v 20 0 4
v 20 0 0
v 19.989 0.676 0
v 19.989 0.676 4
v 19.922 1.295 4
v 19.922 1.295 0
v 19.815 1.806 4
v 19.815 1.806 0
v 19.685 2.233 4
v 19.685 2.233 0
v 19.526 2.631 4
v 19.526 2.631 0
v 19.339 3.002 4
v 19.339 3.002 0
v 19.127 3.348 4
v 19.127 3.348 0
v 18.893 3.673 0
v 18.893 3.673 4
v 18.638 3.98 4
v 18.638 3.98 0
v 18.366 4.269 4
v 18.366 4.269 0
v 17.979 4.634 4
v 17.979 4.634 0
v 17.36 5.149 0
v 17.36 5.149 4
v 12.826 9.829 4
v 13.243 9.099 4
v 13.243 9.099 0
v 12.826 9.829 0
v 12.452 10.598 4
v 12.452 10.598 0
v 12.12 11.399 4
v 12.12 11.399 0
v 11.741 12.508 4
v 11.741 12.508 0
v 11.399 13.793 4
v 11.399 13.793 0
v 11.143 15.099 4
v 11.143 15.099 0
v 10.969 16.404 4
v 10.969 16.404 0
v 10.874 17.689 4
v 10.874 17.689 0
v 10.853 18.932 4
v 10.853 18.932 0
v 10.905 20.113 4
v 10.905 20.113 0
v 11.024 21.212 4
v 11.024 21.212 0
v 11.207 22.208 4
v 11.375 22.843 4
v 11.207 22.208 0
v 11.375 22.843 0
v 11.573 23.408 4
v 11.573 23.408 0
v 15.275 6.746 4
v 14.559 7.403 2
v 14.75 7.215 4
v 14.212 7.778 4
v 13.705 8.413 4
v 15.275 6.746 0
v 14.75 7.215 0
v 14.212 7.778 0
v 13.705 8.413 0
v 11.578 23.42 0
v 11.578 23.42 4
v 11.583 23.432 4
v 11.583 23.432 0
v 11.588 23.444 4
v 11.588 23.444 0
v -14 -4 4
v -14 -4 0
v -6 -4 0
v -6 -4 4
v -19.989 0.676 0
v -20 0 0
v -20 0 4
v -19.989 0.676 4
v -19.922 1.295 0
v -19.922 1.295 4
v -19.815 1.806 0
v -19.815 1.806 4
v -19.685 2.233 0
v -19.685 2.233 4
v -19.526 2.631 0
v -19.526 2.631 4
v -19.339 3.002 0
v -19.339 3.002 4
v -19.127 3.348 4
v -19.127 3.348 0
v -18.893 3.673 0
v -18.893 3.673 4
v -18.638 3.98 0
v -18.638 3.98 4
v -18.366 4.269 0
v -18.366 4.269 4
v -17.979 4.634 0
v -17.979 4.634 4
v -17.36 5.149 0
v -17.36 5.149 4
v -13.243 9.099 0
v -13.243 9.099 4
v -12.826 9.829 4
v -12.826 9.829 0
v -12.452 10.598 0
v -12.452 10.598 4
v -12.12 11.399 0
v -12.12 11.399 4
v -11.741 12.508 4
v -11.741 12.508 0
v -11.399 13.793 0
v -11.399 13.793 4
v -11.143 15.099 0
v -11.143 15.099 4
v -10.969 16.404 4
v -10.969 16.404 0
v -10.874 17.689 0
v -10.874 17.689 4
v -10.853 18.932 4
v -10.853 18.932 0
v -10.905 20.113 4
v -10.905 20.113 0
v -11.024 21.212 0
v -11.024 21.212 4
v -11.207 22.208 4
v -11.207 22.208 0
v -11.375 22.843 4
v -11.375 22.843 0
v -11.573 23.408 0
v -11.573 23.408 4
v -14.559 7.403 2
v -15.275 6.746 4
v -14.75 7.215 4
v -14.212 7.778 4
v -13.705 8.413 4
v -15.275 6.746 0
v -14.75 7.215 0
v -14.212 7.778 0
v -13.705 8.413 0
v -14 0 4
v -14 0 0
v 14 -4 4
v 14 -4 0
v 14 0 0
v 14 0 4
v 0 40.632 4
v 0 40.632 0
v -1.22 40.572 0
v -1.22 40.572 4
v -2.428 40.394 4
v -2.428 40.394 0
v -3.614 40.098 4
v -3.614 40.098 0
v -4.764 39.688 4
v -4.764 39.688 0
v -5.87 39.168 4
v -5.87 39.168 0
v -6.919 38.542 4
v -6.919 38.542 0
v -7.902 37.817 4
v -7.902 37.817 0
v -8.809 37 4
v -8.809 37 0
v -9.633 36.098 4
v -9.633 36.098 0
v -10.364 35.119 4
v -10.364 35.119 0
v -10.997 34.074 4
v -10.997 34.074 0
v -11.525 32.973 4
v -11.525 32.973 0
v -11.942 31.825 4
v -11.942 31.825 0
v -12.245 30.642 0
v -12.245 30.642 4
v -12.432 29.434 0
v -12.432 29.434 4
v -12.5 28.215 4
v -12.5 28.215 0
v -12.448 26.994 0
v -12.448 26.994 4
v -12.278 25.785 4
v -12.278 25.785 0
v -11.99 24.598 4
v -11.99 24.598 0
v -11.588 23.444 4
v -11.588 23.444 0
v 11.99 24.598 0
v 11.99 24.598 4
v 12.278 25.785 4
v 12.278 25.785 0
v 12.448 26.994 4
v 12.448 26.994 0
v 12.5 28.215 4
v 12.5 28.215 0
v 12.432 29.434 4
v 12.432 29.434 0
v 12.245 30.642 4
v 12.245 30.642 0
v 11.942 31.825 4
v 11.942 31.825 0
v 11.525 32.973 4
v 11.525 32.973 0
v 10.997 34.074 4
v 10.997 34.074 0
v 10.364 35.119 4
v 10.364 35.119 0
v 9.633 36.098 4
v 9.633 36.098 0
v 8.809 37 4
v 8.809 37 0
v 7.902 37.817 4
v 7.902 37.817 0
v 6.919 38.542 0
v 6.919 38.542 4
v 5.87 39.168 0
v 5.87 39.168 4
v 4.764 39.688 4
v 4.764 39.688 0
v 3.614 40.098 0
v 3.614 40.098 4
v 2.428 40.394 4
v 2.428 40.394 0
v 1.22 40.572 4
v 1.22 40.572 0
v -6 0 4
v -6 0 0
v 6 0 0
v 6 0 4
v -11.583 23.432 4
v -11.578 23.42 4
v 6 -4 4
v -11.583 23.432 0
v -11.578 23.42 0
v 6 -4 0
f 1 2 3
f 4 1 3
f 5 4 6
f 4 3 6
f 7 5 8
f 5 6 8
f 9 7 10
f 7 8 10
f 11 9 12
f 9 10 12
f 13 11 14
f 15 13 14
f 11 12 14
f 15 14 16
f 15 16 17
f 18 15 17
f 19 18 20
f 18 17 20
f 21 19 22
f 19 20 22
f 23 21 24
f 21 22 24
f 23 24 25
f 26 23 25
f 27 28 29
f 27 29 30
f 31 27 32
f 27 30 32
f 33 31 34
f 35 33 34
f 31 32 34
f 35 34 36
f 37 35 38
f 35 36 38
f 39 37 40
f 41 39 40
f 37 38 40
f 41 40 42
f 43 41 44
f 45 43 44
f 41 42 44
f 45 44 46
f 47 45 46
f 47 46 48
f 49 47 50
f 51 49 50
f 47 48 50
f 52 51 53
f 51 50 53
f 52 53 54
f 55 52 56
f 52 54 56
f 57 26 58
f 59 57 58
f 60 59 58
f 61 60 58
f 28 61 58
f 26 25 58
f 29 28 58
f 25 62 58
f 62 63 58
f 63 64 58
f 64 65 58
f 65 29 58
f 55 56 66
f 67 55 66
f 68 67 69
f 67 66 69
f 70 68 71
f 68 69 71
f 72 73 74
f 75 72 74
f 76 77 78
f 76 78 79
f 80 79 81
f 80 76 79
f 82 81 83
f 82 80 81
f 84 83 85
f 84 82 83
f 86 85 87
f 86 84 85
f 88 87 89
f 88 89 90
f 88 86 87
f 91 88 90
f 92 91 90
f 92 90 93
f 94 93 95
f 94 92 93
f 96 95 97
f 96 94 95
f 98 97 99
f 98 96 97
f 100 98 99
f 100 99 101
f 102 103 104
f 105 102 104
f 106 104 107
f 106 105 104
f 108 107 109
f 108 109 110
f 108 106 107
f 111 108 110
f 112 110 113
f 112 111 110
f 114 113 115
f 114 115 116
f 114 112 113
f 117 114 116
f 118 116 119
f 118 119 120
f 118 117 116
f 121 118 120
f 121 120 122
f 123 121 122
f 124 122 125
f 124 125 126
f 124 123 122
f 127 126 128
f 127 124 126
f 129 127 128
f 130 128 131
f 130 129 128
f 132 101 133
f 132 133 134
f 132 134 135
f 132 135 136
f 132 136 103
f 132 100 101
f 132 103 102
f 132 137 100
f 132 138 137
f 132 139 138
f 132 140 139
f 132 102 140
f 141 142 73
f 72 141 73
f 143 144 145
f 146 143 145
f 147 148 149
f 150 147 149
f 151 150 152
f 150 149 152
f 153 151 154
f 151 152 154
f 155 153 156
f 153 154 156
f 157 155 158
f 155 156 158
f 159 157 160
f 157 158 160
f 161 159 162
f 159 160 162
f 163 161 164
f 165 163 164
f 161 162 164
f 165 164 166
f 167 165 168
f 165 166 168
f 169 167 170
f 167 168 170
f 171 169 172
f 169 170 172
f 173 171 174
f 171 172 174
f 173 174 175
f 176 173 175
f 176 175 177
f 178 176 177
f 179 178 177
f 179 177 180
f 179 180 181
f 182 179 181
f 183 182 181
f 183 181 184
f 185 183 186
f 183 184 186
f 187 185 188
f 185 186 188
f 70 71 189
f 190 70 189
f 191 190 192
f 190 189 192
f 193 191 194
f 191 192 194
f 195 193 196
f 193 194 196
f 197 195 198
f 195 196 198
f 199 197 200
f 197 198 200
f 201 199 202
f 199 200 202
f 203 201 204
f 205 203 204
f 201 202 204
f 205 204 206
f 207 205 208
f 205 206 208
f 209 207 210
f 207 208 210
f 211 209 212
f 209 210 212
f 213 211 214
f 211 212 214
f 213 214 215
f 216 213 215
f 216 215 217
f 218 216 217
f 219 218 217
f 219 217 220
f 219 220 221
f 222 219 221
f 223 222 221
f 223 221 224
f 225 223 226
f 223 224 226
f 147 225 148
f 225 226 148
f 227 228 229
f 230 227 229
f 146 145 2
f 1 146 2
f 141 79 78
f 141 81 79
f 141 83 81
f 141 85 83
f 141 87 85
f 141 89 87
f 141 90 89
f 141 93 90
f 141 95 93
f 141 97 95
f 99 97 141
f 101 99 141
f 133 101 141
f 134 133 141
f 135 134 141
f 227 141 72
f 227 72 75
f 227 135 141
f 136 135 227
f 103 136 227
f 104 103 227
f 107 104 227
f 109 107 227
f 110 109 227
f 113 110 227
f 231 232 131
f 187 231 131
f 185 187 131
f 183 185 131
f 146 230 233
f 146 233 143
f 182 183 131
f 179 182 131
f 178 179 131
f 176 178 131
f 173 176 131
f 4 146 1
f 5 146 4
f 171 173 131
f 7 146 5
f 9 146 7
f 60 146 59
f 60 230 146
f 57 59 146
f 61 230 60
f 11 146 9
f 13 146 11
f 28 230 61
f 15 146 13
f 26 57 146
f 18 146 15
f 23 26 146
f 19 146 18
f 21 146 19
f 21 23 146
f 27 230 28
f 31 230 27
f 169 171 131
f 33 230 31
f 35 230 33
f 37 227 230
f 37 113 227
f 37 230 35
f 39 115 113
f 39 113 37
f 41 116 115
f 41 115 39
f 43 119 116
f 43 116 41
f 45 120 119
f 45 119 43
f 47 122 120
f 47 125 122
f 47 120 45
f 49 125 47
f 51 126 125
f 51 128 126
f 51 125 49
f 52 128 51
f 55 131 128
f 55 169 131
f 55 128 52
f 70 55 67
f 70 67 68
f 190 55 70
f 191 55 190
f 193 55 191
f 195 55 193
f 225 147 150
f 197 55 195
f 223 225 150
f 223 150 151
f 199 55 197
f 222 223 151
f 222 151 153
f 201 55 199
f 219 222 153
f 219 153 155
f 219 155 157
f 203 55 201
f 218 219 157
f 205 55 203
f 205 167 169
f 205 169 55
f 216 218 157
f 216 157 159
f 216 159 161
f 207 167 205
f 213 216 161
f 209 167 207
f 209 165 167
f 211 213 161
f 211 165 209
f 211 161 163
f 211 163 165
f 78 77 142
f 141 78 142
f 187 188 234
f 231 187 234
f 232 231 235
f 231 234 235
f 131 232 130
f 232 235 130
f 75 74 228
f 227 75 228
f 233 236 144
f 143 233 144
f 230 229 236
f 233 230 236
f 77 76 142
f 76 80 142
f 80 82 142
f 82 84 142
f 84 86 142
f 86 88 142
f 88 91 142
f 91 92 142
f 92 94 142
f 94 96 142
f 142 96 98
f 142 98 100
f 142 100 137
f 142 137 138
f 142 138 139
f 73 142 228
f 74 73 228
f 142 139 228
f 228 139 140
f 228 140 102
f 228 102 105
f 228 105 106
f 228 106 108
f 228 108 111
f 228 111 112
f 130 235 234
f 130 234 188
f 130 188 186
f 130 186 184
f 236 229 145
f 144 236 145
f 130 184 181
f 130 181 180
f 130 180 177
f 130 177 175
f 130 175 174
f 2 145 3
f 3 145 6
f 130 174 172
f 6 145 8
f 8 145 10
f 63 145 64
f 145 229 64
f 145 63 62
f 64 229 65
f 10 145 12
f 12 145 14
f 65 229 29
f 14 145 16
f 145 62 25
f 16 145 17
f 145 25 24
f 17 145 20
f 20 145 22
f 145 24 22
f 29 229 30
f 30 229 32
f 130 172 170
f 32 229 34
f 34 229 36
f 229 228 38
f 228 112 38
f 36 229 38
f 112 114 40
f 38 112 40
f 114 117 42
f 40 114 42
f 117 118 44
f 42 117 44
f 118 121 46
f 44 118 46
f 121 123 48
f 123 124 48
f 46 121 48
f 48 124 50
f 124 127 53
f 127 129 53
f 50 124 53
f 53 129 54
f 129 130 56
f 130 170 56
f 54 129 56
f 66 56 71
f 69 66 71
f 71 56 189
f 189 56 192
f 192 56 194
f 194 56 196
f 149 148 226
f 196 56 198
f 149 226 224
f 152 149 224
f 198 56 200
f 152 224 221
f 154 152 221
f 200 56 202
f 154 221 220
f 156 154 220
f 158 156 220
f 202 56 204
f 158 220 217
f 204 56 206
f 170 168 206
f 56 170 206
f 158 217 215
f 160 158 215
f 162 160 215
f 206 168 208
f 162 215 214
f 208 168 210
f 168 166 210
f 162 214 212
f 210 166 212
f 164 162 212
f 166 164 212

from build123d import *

# Parameters (mm, degrees)
BOSS_EXTRUDE1_DEPTH = 4


with BuildPart() as part:
    # Sketch1 → Boss-Extrude1 (new body)
    with BuildSketch(Plane.XY):
        with BuildLine():
            Line((-6, 0), (0, 0))
            Line((0, 0), (0, 40.631746277))
            ThreePointArc((0, 40.631746277), (-10.364472675, 35.119428737), (-11.587783027, 23.444179263))
            ThreePointArc((-11.587783027, 23.444179263), (-11.580453389, 23.426100806), (-11.573095546, 23.40803381))
            add(Edge.make_bspline(
                [(-20, 0), (-20.119909127, 4.314498585), (-10.868715854, 6.603153145), (-10.177575907, 19.938030034), (-11.573095546, 23.40803381)],
                knots=[0, 0, 0, 0, 0.217805144, 0.603787586, 0.603787586, 0.603787586, 0.603787586], degree=3))
            Line((-20, 0), (-14, 0))
            Line((-14, 0), (-14, -4))
            Line((-14, -4), (-6, -4))
            Line((-6, -4), (-6, 0))
        make_face()
        with BuildLine():
            Line((0, 40.631746277), (0, 0))
            Line((0, 0), (6, 0))
            Line((6, 0), (6, -4))
            Line((6, -4), (14, -4))
            Line((14, -4), (14, 0))
            Line((14, 0), (20, 0))
            add(Edge.make_bspline(
                [(20, 0), (20.119909127, 4.314498585), (10.868715854, 6.603153145), (10.177575907, 19.938030034), (11.573095546, 23.40803381)],
                knots=[0, 0, 0, 0, 0.217805144, 0.603787586, 0.603787586, 0.603787586, 0.603787586], degree=3))
            ThreePointArc((11.573095546, 23.40803381), (11.580453389, 23.426100806), (11.587783027, 23.444179263))
            ThreePointArc((11.587783027, 23.444179263), (10.364472675, 35.119428737), (0, 40.631746277))
        make_face()
    extrude(amount=BOSS_EXTRUDE1_DEPTH)


solid = part.part
